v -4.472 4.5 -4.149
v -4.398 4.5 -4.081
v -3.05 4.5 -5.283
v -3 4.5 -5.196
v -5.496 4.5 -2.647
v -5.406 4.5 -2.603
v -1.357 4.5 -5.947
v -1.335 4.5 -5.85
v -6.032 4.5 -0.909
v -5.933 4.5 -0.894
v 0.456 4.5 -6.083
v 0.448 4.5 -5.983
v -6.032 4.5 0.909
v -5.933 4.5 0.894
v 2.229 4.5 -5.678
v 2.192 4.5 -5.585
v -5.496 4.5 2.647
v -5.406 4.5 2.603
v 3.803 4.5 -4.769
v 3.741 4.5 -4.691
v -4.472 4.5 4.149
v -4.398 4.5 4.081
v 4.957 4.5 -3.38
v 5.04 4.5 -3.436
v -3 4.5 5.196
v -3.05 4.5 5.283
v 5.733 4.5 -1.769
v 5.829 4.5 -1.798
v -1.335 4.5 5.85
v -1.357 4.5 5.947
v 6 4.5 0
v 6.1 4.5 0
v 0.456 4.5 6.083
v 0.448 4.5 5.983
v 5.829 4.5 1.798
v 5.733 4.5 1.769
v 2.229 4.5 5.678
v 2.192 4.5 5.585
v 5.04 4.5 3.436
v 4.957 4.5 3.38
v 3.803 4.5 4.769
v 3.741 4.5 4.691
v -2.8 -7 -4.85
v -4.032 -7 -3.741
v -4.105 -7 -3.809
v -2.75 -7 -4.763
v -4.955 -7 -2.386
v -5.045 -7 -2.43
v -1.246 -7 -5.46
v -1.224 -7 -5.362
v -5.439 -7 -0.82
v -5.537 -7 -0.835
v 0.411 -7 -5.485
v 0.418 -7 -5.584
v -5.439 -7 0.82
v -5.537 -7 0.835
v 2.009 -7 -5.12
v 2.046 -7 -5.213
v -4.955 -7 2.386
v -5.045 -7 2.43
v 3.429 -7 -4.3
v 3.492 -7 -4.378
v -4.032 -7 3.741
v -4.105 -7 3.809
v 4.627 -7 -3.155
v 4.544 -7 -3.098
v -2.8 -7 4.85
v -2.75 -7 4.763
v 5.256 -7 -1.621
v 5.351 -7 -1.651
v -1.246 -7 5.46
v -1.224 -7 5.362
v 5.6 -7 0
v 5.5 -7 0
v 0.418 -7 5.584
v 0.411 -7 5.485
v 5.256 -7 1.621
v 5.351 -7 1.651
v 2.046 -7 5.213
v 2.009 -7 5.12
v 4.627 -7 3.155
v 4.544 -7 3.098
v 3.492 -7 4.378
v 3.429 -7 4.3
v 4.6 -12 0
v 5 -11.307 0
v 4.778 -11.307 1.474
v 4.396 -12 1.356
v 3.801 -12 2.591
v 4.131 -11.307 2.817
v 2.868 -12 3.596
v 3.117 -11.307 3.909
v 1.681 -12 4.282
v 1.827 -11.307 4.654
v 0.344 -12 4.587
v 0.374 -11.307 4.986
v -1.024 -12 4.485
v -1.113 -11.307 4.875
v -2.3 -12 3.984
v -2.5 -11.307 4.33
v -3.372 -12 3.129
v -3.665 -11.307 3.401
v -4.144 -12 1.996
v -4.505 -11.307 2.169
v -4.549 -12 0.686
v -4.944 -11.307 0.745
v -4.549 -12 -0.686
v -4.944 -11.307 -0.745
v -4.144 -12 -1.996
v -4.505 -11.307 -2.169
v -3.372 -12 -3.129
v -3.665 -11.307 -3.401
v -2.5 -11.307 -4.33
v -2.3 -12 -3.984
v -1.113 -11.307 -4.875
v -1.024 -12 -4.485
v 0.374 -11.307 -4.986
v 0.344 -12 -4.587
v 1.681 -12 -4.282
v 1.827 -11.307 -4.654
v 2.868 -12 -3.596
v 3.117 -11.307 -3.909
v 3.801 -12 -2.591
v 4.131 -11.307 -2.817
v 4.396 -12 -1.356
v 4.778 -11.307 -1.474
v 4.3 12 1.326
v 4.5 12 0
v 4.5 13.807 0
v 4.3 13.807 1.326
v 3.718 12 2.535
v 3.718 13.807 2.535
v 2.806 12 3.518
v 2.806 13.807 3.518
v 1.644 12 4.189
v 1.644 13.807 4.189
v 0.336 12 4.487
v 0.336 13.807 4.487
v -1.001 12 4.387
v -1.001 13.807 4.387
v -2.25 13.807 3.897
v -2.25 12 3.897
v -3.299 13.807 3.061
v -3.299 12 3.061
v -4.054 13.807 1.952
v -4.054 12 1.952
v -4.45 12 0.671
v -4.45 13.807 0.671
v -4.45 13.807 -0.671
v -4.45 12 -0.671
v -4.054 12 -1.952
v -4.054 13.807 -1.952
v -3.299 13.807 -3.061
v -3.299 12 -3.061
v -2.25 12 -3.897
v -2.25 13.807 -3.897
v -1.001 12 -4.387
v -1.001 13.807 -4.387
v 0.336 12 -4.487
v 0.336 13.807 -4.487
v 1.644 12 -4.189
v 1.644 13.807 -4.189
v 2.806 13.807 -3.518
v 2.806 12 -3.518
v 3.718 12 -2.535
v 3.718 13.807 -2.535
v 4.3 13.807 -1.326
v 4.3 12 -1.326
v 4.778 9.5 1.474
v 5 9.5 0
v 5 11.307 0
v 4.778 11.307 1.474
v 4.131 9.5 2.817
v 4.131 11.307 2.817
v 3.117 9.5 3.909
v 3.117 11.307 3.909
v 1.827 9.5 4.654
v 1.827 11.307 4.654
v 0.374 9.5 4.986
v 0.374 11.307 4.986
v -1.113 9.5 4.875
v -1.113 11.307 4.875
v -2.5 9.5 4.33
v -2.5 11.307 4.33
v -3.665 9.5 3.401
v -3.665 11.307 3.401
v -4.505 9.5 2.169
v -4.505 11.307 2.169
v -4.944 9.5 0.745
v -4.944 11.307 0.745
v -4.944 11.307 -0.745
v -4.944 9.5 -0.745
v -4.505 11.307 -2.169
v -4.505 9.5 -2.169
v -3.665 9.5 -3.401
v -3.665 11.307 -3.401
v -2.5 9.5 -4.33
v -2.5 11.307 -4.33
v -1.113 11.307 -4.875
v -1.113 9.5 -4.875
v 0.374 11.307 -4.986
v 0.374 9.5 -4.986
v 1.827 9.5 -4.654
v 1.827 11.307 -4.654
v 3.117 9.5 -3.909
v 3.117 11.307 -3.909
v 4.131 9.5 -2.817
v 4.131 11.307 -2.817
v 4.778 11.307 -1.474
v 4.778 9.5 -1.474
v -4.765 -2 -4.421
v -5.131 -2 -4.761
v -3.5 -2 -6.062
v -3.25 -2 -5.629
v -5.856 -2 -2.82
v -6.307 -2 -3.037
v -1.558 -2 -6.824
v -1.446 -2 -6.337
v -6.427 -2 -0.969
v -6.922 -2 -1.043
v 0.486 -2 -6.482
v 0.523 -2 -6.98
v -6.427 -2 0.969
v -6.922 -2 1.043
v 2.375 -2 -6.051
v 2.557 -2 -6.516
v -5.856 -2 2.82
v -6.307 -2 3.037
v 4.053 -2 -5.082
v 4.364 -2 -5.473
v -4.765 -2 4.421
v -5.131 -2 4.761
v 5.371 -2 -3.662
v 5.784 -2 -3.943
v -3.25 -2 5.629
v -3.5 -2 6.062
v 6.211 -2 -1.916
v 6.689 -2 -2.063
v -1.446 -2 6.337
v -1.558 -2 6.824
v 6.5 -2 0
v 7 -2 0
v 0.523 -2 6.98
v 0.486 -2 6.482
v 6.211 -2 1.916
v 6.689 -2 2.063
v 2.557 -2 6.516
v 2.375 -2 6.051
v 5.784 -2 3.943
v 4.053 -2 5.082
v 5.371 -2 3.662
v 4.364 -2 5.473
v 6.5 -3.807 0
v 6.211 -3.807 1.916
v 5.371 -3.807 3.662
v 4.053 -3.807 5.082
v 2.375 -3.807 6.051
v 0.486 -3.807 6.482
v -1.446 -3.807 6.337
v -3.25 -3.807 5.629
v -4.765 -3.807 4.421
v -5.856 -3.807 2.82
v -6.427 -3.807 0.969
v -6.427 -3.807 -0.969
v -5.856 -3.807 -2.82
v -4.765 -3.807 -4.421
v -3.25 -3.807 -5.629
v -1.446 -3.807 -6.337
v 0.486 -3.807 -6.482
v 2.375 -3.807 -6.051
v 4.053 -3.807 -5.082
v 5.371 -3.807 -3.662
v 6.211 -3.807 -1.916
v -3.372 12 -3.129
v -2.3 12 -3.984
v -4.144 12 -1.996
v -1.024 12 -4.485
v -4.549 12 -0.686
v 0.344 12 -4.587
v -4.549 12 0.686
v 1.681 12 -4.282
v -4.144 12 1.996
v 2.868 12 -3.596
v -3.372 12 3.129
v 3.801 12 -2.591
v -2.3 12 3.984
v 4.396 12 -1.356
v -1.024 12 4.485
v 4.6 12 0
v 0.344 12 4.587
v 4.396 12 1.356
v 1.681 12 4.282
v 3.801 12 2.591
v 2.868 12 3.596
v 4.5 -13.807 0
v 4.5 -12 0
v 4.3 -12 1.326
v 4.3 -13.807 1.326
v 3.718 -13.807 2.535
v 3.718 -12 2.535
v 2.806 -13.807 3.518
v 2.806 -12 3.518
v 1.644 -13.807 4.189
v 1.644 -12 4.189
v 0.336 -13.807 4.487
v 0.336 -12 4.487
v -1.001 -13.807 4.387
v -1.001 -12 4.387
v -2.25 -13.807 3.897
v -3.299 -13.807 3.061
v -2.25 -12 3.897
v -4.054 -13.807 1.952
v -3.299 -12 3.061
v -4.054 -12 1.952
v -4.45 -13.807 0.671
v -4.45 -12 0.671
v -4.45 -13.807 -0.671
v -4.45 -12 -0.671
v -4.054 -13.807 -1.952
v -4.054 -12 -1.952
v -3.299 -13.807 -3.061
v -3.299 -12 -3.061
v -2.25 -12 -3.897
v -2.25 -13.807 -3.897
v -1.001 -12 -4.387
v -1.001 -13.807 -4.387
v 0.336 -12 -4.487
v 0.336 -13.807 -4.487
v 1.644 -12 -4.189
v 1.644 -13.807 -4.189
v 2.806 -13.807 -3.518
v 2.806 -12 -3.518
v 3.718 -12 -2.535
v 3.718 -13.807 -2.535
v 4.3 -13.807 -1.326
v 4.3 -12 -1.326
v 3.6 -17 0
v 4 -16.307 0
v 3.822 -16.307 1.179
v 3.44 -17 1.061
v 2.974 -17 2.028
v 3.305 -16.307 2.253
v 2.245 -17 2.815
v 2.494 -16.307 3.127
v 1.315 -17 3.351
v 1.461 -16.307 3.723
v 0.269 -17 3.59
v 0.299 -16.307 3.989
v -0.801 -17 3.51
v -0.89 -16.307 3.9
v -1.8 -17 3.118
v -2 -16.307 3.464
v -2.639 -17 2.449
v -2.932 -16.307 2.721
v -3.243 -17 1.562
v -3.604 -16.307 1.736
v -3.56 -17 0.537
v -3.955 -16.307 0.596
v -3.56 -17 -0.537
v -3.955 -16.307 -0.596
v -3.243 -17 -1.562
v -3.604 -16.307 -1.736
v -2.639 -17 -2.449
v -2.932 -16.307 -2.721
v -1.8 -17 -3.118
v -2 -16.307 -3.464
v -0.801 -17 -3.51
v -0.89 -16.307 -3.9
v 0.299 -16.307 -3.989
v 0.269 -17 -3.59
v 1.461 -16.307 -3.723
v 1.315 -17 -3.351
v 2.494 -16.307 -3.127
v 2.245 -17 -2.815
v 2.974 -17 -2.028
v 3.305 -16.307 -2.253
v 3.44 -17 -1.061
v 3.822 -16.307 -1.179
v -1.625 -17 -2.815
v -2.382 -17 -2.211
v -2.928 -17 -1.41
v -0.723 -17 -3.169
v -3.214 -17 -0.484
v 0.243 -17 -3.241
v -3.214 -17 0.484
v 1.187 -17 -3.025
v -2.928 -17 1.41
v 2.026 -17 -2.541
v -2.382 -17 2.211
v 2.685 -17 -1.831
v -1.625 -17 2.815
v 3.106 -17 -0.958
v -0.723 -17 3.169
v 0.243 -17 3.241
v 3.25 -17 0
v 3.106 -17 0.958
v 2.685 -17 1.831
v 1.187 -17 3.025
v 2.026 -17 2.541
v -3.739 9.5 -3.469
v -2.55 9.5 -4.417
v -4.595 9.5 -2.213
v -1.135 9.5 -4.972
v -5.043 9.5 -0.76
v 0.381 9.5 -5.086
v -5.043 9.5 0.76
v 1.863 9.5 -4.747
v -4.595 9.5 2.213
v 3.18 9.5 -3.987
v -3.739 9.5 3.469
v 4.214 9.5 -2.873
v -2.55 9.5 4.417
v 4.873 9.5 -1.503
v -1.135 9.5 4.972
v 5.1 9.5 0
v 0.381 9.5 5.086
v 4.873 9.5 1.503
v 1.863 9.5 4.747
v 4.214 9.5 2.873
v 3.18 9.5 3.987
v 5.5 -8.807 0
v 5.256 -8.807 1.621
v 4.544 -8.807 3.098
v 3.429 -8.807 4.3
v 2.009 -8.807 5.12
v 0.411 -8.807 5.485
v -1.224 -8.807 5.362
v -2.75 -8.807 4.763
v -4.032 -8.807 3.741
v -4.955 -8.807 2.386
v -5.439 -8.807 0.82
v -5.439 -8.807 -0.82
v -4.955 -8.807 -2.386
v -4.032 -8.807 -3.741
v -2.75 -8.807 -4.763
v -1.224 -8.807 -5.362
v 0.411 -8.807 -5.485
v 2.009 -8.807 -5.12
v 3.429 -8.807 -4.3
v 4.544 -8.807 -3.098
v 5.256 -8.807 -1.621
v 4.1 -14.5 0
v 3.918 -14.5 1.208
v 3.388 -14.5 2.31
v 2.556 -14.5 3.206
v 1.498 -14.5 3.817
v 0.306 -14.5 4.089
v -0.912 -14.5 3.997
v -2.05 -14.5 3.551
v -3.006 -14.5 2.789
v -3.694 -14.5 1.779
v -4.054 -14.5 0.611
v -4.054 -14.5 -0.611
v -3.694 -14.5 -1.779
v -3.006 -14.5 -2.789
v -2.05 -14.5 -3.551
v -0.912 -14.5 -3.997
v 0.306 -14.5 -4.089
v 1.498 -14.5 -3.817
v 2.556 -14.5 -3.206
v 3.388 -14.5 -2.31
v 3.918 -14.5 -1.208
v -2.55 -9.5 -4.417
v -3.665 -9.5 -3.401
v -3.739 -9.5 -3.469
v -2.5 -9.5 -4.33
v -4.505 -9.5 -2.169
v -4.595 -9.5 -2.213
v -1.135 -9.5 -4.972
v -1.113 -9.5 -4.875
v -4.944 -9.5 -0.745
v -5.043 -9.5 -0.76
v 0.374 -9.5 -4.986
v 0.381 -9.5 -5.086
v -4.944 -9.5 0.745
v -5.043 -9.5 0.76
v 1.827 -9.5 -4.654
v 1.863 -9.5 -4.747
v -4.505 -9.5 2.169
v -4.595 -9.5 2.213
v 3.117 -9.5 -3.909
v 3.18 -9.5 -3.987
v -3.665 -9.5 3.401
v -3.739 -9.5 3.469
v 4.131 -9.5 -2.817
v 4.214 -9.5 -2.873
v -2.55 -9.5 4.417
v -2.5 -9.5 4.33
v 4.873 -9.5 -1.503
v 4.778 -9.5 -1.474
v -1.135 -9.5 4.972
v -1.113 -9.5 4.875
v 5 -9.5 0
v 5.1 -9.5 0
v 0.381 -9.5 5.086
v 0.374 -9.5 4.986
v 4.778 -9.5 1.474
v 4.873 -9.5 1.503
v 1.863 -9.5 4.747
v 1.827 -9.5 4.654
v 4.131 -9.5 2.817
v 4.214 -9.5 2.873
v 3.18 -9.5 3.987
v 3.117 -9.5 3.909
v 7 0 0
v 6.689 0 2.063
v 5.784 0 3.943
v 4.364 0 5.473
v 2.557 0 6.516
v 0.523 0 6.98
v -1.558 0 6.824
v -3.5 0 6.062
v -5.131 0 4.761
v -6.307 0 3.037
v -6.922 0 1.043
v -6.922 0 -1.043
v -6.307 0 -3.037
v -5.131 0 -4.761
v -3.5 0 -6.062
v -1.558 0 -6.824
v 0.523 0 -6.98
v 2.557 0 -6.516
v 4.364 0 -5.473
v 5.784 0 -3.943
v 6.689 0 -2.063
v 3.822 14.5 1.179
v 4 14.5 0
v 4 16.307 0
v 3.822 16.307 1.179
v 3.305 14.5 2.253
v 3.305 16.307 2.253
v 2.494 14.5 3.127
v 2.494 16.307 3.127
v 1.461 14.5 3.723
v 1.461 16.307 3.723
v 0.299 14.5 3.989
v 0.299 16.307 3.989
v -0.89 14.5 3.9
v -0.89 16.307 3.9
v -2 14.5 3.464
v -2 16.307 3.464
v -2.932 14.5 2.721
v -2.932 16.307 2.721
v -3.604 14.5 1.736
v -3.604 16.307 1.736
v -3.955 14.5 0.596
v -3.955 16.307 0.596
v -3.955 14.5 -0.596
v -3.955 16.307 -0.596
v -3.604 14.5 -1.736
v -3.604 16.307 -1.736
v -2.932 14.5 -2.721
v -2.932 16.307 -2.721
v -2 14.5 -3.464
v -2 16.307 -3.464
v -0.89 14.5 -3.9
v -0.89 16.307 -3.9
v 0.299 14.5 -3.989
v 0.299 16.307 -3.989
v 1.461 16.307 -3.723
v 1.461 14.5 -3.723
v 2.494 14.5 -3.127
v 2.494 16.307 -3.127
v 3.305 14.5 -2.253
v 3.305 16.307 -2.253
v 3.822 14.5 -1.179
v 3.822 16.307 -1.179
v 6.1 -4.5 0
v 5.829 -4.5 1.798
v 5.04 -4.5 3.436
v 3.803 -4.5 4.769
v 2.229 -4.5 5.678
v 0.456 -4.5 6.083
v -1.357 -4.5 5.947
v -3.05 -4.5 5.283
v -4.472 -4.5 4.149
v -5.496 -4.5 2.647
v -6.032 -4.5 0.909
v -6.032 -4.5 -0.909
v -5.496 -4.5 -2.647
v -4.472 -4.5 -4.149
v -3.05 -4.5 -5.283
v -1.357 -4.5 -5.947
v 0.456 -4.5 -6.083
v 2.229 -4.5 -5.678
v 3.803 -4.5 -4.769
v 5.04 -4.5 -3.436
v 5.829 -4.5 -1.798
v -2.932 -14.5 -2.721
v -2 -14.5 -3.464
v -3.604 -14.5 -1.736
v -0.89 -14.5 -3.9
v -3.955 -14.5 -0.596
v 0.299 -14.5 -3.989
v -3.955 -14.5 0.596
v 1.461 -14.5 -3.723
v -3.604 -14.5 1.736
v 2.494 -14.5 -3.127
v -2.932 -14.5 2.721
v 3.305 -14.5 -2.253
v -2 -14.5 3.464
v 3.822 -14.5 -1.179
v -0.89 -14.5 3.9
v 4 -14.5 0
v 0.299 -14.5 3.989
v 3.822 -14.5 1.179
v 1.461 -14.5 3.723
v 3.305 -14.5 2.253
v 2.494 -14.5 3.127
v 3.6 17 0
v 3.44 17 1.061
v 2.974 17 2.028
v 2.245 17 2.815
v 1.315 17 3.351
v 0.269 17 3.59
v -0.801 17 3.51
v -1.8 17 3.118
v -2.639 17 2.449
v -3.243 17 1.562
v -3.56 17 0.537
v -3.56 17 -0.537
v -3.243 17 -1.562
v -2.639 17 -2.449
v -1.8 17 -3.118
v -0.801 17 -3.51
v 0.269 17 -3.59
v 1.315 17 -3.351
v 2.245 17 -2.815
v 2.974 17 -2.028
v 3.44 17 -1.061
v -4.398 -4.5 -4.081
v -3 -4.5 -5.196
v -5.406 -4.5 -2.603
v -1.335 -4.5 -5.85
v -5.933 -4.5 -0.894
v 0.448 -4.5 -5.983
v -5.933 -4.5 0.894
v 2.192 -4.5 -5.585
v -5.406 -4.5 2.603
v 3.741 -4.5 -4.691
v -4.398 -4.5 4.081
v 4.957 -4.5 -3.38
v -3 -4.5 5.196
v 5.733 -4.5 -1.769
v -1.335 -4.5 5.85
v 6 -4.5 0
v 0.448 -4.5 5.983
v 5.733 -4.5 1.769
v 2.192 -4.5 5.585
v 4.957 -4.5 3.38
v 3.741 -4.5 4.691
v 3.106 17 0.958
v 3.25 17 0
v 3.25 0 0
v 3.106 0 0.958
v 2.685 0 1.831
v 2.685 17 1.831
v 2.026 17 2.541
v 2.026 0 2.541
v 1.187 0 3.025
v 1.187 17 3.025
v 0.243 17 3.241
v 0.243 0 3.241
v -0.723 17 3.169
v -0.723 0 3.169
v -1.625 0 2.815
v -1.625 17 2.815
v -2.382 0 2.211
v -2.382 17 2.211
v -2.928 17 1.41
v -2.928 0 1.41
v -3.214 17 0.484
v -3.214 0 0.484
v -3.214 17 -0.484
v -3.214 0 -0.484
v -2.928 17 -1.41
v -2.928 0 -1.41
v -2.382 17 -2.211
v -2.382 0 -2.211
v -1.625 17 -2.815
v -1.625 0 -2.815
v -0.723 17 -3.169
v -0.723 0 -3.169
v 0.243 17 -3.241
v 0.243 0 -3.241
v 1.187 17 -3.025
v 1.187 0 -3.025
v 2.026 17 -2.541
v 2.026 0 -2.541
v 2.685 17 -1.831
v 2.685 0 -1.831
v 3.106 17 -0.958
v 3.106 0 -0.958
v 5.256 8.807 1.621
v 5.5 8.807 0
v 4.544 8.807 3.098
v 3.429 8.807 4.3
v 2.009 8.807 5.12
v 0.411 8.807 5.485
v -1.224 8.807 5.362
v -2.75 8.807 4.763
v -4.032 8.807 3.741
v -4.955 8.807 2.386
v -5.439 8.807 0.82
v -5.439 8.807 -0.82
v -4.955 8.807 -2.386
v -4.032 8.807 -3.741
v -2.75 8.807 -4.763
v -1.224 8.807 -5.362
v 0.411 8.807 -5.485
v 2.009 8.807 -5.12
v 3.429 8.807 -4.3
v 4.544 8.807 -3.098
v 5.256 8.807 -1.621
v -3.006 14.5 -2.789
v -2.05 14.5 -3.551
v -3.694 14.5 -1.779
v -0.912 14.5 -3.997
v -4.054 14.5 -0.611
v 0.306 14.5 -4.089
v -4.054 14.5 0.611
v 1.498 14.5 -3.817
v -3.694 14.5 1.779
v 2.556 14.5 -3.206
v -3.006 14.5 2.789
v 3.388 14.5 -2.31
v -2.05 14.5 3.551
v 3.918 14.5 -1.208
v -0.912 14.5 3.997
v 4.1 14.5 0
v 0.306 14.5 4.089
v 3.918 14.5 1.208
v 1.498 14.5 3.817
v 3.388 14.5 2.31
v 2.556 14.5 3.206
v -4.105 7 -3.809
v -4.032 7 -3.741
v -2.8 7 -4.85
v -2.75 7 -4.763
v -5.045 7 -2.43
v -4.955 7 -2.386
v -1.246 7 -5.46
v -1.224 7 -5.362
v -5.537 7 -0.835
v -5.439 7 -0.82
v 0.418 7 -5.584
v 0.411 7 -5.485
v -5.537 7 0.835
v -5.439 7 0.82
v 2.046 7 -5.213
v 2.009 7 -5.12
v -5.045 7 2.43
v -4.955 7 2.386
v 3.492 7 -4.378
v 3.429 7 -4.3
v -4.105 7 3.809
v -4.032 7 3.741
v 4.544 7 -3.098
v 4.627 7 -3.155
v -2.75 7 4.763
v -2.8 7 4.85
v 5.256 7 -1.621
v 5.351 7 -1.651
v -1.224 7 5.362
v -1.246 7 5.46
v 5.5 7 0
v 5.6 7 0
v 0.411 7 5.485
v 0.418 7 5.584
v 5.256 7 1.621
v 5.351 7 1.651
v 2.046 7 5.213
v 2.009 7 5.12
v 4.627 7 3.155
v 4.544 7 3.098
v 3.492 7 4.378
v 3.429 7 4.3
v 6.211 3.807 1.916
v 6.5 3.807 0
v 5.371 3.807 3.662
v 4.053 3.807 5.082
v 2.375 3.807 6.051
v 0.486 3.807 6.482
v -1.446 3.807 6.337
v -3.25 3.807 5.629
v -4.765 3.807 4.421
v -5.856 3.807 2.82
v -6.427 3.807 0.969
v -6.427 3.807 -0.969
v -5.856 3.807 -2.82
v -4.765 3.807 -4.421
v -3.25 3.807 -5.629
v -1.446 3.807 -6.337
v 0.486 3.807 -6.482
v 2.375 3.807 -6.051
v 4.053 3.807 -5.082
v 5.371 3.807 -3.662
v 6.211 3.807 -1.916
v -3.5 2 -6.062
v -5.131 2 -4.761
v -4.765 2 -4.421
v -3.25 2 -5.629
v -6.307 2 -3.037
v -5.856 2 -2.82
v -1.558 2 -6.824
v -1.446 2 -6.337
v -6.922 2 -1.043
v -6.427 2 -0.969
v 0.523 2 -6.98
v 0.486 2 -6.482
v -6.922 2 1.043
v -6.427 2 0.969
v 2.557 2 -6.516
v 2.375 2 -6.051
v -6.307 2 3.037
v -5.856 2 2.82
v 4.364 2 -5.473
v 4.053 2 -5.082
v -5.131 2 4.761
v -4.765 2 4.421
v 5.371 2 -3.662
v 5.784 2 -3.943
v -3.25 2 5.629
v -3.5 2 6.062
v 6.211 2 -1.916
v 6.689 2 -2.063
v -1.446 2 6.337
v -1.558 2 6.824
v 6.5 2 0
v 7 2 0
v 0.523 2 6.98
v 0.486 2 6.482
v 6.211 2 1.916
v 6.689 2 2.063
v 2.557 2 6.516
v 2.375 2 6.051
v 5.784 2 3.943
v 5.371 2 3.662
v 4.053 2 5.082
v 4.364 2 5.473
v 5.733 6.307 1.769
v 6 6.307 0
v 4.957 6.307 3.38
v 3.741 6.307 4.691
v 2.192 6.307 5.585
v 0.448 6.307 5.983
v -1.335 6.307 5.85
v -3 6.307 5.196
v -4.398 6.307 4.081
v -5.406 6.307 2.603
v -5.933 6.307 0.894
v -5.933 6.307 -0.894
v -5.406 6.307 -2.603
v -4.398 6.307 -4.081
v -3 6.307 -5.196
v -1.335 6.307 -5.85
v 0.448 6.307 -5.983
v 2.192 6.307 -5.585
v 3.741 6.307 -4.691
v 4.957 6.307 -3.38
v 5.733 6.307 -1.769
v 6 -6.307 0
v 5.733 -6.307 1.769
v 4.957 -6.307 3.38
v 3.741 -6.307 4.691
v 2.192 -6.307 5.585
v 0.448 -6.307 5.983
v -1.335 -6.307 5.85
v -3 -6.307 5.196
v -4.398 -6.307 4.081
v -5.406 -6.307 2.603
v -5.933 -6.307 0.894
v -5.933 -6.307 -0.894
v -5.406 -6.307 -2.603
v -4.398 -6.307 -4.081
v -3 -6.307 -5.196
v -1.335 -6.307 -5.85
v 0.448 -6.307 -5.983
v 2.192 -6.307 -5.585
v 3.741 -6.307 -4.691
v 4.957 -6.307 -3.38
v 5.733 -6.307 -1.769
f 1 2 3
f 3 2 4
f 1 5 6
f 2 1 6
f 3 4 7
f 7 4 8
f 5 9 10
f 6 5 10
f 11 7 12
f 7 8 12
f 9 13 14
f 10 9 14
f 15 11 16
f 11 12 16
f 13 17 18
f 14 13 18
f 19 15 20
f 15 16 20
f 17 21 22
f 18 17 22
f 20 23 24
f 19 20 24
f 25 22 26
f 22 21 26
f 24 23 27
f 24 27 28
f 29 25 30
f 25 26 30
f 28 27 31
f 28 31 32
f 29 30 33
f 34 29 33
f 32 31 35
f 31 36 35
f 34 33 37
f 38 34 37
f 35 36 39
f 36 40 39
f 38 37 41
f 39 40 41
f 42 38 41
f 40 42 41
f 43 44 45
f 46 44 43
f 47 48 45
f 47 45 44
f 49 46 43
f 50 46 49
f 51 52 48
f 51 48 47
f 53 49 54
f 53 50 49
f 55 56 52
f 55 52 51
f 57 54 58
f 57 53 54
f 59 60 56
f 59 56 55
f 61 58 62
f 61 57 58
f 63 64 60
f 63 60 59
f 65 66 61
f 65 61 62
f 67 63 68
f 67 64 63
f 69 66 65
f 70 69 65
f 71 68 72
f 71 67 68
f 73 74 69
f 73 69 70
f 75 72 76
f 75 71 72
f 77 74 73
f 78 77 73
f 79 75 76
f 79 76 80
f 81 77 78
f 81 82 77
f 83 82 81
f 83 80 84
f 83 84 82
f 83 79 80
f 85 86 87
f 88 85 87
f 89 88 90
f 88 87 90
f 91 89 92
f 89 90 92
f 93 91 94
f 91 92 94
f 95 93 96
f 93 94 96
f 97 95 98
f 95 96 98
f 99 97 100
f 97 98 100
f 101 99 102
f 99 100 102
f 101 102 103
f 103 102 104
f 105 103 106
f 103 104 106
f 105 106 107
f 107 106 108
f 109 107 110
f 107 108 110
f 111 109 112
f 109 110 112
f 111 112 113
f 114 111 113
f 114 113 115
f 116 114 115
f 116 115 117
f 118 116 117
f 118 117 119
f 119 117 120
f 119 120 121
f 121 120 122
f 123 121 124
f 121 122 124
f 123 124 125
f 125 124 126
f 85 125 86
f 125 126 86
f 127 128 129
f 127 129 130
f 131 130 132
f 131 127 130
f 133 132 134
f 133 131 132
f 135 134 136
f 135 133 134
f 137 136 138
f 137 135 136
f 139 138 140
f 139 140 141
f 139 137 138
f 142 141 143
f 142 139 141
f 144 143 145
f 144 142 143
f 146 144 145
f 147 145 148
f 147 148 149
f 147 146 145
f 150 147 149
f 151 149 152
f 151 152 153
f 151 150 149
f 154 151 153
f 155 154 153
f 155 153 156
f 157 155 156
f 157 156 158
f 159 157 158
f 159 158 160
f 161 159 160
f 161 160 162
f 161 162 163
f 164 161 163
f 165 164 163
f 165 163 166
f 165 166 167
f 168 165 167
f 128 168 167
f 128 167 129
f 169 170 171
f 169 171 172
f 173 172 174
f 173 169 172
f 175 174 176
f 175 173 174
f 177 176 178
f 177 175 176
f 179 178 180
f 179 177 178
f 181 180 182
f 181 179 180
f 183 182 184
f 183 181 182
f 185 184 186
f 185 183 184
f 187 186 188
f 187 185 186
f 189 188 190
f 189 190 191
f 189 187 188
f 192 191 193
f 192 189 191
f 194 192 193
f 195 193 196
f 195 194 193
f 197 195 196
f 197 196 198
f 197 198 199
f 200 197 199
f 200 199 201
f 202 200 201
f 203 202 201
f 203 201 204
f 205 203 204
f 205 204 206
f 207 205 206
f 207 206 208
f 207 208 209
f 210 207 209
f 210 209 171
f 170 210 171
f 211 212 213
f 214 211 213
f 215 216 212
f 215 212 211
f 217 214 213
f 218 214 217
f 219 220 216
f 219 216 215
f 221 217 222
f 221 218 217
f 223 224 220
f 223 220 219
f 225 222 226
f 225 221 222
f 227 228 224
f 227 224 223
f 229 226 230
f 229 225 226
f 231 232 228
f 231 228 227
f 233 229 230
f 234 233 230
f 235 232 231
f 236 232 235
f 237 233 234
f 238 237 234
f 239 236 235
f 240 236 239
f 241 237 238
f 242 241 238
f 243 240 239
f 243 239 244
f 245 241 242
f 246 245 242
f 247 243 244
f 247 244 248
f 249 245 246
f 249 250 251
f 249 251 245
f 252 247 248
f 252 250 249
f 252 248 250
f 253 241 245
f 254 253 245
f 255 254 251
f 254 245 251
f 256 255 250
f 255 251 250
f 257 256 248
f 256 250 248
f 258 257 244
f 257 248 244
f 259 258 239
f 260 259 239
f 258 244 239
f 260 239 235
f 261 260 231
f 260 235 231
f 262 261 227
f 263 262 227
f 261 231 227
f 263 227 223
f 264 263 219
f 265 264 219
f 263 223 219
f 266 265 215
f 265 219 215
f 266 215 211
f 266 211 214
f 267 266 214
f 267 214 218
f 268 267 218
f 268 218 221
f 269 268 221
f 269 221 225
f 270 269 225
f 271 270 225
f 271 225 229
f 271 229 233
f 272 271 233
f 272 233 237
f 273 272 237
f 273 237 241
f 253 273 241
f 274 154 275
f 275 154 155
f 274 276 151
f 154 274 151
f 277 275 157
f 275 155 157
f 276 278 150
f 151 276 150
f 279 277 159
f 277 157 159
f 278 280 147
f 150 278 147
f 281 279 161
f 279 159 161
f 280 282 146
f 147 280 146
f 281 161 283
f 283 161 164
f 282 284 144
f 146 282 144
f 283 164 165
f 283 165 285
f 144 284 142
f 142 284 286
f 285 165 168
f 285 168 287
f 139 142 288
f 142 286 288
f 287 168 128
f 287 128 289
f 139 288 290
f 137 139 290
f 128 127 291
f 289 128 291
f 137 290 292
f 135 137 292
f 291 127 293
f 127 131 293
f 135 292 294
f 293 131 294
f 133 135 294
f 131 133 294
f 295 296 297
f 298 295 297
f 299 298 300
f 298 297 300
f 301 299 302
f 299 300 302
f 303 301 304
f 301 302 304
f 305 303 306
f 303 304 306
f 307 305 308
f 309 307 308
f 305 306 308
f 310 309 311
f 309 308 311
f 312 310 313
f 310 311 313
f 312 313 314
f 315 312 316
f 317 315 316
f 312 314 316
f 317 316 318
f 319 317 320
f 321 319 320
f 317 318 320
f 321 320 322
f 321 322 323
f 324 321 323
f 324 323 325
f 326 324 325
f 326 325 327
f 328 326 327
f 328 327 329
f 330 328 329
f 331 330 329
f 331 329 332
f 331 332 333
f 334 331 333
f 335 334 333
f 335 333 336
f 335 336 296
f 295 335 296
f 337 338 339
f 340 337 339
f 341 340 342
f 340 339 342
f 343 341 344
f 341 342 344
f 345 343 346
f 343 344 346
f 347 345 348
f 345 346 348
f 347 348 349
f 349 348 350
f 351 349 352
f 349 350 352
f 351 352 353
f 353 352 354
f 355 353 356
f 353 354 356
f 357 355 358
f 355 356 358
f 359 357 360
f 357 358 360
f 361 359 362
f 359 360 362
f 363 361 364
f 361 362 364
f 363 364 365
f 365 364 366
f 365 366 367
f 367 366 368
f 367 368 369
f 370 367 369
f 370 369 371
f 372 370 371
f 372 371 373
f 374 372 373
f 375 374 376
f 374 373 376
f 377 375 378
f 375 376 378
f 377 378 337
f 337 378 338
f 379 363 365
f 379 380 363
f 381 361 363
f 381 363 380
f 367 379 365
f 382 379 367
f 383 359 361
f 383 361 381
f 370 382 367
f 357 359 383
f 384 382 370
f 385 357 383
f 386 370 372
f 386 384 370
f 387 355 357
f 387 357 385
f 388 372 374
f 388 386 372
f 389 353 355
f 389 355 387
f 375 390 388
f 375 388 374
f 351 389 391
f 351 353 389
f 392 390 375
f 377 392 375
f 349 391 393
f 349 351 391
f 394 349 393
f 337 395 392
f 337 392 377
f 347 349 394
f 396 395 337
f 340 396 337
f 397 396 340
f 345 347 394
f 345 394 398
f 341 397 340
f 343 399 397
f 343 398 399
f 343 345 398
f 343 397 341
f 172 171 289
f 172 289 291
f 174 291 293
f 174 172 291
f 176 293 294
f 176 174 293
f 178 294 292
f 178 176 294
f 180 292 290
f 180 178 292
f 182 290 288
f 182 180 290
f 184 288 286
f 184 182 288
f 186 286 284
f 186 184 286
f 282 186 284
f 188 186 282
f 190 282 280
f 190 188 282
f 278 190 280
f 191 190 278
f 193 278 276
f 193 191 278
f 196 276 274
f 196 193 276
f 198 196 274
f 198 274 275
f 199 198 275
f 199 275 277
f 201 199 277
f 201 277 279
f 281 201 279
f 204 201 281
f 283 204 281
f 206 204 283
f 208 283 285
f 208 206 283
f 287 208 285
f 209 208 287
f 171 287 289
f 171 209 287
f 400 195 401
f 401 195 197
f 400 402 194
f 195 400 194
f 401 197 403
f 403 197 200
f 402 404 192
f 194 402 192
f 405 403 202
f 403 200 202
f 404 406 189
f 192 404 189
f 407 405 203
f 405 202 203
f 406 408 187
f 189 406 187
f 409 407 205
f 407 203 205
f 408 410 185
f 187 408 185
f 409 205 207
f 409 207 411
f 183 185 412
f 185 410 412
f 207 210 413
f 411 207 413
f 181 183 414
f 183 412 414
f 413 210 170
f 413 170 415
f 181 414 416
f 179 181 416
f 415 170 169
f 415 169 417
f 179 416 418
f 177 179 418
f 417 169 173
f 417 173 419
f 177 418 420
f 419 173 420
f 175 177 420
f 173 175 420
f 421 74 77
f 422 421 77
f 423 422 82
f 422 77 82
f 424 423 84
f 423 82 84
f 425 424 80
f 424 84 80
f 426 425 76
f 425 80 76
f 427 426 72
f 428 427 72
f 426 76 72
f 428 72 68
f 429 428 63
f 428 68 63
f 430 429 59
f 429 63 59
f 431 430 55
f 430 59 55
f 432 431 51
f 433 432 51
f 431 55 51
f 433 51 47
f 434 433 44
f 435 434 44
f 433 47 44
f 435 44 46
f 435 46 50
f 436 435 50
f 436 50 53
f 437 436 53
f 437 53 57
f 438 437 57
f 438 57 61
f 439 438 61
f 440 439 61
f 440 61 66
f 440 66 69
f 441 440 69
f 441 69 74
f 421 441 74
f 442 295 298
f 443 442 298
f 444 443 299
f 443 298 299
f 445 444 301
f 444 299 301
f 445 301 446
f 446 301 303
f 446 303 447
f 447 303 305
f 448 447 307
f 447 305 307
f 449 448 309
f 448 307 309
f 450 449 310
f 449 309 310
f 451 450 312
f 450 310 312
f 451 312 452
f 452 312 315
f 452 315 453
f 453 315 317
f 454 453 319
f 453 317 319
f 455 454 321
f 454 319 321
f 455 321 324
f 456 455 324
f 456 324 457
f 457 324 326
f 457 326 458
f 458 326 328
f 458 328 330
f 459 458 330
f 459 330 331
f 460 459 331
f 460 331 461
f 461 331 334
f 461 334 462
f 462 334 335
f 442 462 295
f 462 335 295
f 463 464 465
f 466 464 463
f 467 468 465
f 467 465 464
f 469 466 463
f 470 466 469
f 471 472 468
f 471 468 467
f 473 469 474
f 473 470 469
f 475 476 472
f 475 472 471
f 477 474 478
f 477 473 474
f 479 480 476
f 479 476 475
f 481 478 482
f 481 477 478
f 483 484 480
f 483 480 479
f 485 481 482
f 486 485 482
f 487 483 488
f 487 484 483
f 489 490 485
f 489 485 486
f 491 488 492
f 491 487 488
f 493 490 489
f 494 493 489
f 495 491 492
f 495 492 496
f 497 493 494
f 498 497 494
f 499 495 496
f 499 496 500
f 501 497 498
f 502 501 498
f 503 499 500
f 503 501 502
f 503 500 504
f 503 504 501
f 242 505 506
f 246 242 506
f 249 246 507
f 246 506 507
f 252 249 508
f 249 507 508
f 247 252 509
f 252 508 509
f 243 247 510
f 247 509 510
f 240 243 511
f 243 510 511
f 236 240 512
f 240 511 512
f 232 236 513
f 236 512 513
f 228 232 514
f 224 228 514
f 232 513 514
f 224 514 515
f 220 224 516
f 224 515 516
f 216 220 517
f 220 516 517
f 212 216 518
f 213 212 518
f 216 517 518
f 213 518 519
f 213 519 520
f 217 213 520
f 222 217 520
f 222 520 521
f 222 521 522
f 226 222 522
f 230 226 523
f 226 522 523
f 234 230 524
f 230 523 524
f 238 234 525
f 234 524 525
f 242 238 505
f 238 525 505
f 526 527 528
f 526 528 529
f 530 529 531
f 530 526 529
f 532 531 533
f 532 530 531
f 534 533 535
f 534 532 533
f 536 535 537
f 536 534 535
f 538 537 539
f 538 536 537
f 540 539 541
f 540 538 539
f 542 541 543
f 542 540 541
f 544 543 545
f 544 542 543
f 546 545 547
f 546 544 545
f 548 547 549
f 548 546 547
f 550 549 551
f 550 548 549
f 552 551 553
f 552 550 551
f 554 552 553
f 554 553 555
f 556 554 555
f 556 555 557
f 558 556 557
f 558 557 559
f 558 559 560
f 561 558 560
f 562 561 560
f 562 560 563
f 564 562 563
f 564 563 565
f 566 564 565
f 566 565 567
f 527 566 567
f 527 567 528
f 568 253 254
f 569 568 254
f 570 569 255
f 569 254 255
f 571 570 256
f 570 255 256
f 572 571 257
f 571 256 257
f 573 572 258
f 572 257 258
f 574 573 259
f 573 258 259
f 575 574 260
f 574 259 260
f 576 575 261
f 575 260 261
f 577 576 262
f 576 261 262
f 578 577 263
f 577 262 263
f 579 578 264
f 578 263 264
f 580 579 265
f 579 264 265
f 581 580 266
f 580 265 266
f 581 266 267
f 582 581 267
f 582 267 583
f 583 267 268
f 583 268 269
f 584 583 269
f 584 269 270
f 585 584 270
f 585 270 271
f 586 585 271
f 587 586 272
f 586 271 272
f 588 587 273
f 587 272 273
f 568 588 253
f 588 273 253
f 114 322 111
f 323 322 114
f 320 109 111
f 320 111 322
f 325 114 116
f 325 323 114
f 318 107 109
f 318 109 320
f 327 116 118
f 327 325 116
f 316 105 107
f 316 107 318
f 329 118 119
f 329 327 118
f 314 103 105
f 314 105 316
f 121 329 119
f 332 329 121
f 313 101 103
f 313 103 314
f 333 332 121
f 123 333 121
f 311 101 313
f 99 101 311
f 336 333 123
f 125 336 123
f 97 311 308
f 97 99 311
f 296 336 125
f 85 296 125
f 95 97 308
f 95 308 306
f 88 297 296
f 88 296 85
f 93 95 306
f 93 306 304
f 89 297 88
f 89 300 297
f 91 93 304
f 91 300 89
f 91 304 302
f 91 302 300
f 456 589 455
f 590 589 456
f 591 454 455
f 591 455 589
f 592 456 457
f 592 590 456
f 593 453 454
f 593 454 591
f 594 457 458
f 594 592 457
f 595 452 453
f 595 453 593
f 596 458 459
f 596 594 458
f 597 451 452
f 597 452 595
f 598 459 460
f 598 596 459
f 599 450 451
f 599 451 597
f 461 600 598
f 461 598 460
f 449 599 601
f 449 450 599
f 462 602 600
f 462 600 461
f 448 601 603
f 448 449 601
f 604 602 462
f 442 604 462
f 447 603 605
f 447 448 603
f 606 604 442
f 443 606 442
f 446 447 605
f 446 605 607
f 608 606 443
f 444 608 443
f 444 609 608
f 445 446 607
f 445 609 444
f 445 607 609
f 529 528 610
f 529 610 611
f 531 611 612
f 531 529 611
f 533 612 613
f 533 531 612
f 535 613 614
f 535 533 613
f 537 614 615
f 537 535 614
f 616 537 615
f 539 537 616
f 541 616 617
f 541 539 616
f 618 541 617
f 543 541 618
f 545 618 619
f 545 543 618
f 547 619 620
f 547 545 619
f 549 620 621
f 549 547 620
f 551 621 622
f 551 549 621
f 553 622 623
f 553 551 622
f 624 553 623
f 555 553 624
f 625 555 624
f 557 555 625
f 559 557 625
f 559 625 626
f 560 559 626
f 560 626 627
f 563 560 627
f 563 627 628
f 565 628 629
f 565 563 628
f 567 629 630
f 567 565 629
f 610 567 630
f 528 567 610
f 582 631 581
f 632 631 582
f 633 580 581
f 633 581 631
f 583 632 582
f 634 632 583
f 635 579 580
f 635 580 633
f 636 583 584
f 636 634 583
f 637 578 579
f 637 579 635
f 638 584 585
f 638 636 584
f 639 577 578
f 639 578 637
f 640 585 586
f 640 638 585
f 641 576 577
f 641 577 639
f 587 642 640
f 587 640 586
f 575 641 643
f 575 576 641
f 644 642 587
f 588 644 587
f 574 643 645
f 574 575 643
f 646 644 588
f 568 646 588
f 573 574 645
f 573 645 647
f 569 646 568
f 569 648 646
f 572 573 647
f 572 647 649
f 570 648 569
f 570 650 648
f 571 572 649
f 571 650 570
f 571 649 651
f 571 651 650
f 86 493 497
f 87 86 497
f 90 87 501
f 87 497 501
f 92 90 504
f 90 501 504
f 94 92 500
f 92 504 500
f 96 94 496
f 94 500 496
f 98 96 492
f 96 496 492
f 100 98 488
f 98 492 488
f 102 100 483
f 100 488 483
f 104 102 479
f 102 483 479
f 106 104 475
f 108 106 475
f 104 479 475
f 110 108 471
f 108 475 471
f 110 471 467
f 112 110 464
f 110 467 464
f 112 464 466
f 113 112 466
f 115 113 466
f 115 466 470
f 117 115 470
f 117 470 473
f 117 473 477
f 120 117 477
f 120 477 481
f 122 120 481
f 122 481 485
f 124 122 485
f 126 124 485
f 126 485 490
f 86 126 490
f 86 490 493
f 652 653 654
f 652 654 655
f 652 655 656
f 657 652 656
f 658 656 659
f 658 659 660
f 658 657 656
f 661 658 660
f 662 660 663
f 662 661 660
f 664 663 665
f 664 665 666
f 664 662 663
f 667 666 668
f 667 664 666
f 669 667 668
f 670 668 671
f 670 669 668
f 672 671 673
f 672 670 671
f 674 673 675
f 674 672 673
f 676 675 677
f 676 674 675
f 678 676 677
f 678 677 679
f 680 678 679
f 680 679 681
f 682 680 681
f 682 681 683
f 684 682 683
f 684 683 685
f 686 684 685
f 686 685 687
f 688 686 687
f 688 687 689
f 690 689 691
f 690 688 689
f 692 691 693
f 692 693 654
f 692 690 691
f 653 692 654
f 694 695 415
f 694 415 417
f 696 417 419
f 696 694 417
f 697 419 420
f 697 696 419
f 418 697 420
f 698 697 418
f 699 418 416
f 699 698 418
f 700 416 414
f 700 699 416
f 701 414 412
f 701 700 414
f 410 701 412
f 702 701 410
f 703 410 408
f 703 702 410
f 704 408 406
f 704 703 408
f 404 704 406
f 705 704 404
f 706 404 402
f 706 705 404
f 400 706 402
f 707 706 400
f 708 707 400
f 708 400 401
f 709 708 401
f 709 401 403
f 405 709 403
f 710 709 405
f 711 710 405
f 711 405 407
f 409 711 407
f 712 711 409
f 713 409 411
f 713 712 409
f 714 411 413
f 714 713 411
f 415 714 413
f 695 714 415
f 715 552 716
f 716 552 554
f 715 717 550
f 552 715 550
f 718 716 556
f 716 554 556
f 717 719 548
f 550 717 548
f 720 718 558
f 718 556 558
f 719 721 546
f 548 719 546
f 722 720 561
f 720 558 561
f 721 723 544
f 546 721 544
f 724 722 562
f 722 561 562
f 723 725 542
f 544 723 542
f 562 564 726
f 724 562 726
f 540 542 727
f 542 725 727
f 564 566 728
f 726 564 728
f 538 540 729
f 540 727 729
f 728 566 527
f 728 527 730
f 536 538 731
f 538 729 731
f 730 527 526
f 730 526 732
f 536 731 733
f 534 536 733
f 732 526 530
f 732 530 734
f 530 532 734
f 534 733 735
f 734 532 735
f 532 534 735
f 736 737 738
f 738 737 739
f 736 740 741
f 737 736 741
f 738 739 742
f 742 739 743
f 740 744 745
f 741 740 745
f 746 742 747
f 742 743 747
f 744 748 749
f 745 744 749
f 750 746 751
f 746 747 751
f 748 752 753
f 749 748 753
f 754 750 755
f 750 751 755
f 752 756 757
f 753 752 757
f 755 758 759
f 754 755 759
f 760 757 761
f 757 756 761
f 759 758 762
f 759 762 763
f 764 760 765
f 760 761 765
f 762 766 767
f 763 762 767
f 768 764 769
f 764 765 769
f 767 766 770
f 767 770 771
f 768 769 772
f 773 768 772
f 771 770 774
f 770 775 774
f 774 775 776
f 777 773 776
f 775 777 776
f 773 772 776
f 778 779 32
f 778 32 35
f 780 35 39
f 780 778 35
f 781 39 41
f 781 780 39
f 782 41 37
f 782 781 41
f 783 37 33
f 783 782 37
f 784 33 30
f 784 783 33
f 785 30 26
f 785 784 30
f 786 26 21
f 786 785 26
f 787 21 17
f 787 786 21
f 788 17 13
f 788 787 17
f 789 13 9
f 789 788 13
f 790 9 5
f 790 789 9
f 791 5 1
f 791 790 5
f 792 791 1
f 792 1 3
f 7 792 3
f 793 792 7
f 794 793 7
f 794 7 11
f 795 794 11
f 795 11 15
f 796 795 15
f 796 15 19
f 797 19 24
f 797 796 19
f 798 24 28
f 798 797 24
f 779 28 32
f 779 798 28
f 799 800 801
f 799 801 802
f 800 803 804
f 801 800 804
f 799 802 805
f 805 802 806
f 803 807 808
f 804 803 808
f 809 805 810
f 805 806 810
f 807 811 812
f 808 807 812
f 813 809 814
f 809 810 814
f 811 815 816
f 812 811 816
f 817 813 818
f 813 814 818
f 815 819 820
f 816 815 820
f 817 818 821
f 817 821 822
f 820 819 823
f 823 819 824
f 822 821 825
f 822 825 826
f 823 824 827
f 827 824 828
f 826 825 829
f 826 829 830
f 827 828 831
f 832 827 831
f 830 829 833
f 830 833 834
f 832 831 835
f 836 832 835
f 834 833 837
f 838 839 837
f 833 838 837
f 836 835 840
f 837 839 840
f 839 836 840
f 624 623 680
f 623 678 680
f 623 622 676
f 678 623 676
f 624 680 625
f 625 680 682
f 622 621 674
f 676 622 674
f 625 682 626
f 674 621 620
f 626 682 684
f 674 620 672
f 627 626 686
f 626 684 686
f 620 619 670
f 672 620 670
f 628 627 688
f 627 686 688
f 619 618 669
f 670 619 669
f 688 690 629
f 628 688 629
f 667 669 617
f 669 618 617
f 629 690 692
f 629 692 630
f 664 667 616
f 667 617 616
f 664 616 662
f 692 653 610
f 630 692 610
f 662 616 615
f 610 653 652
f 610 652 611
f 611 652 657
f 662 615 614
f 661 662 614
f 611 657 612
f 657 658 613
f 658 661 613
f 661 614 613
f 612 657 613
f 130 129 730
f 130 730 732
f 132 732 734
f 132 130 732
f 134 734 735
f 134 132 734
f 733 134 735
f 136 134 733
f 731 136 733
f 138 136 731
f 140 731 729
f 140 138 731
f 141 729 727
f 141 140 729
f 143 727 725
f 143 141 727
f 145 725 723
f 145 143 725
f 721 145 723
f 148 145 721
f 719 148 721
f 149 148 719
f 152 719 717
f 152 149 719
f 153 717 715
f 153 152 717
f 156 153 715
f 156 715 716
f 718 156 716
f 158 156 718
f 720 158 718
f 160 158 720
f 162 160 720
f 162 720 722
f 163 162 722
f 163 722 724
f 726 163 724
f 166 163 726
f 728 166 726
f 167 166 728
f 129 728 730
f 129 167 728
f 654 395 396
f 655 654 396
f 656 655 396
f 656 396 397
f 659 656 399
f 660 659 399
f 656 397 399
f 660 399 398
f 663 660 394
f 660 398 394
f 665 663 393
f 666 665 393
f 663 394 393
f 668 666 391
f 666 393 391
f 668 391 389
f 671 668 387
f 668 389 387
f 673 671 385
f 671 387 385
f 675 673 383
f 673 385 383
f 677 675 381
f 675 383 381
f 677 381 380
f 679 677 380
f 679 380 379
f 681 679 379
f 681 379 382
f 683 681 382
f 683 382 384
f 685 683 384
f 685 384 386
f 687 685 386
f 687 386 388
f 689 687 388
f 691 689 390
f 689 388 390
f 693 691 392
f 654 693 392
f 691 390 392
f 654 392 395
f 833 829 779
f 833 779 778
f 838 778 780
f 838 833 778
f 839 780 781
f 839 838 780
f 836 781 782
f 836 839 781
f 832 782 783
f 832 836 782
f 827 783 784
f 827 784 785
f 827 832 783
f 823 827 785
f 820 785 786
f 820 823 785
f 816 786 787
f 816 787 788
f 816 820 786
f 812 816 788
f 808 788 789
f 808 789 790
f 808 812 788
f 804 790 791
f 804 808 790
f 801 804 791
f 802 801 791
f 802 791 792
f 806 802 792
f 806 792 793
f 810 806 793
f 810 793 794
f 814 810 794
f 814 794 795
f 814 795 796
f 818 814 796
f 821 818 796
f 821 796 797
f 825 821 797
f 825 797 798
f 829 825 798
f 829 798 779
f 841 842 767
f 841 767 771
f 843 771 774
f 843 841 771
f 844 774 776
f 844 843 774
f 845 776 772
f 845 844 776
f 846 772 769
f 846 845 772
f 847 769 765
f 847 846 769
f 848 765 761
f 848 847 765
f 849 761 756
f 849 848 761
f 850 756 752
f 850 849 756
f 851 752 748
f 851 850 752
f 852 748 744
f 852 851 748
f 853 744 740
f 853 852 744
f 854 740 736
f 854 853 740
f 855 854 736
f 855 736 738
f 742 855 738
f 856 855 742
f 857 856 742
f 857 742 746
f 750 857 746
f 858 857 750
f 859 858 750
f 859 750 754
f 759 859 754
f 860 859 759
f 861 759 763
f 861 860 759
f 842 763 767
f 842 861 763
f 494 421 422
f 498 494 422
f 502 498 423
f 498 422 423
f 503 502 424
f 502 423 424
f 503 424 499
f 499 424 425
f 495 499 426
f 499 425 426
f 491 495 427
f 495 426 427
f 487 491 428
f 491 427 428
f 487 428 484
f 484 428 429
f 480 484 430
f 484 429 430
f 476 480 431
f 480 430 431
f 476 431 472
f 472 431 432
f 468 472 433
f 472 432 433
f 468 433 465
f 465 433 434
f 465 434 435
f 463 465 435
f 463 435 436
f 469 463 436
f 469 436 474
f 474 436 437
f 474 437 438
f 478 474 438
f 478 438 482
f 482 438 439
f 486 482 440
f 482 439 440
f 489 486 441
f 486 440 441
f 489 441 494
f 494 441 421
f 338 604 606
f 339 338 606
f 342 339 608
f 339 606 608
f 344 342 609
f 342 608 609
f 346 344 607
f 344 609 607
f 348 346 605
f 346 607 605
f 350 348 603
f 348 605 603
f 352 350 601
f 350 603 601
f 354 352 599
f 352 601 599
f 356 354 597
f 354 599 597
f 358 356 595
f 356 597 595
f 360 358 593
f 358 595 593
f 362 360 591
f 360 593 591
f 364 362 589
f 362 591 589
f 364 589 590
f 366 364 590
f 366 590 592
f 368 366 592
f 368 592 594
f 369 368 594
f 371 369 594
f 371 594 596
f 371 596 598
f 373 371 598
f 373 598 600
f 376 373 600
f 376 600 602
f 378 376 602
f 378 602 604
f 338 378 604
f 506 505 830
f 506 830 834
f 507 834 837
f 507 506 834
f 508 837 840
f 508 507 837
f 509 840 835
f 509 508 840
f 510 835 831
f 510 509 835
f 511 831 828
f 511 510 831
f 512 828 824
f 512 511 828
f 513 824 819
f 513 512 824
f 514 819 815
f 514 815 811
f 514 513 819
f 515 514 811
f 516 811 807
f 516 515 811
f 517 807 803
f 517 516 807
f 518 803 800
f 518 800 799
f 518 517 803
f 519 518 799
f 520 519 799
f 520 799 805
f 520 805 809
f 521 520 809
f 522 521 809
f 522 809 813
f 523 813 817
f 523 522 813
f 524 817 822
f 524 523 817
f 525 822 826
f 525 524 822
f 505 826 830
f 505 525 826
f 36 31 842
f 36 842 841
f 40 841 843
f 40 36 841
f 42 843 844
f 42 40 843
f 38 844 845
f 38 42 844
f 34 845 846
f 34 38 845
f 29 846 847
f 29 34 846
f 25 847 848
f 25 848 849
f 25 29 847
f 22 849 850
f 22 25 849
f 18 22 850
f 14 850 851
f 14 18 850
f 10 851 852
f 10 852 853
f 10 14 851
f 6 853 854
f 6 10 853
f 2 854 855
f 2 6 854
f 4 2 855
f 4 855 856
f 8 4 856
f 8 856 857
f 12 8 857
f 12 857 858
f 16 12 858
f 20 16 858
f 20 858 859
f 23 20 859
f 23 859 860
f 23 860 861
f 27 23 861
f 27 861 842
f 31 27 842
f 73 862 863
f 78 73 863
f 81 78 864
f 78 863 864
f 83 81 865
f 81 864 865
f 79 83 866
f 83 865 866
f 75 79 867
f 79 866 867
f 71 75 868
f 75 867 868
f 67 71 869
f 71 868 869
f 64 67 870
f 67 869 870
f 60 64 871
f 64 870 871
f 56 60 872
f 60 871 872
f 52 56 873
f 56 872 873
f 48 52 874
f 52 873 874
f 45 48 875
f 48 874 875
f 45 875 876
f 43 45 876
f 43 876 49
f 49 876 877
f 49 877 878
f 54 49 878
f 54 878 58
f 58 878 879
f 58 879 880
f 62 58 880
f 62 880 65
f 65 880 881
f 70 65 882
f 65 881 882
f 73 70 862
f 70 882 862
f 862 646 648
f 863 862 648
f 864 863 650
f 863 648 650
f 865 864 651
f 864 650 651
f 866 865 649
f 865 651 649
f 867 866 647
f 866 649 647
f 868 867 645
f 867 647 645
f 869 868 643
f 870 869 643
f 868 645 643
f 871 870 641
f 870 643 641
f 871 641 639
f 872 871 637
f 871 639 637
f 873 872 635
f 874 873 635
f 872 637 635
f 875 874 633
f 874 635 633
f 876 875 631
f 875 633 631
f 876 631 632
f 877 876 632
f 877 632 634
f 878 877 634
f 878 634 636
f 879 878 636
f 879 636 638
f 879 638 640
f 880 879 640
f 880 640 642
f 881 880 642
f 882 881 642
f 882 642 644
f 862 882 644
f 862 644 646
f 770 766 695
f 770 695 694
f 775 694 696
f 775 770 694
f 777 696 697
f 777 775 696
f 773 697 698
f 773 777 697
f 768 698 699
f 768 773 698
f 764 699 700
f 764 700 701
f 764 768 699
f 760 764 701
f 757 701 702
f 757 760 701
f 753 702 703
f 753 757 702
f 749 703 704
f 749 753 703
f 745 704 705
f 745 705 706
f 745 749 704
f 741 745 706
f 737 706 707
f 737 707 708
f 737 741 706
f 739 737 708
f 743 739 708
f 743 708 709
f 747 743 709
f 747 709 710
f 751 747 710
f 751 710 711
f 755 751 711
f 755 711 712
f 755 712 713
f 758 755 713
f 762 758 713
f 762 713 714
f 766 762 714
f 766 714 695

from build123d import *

# Parameters (mm, degrees)
F0_R        = 7
F0_R_2      = 6.5
F0_R_3      = 6
F0_R_4      = 5.5
F0_R_5      = 5
F0_R_6      = 4.5
F0_R_7      = 4
F1_DEPTH    = 2
F2_DEPTH    = 4.5
F3_DEPTH    = 7
F4_DEPTH    = 9.5
F5_DEPTH    = 12
F6_DEPTH    = 14.5
F7_DEPTH    = 17
F8_R        = 3.25
F9_DEPTH    = 17
F10_SIZE2   = 0.692820323
F10_SIZE    = 0.4
F10_2_SIZE2 = 0.692820323
F10_2_SIZE  = 0.4
F10_3_SIZE2 = 0.692820323
F10_3_SIZE  = 0.4
F10_4_SIZE2 = 0.692820323
F10_4_SIZE  = 0.4
F10_5_SIZE2 = 0.692820323
F10_5_SIZE  = 0.4
F10_6_SIZE2 = 0.692820323
F10_6_SIZE  = 0.4


with BuildPart() as f1:
    # F0 (on Front) → F1 (new body)
    with BuildSketch(Plane.XZ):
        Circle(F0_R)
        Circle(F0_R_2, mode=Mode.SUBTRACT)
        Circle(F0_R_2)
        Circle(F0_R_3, mode=Mode.SUBTRACT)
        Circle(F0_R_3)
        Circle(F0_R_4, mode=Mode.SUBTRACT)
        Circle(F0_R_4)
        Circle(F0_R_5, mode=Mode.SUBTRACT)
        Circle(F0_R_5)
        Circle(F0_R_6, mode=Mode.SUBTRACT)
        Circle(F0_R_6)
        Circle(F0_R_7, mode=Mode.SUBTRACT)
        Circle(F0_R_7)
    extrude(amount=F1_DEPTH)

    # F0 (on Front) → F2 (join, through all)
    with BuildSketch(Plane.XZ):
        Circle(F0_R_2)
        Circle(F0_R_3, mode=Mode.SUBTRACT)
        Circle(F0_R_3)
        Circle(F0_R_4, mode=Mode.SUBTRACT)
        Circle(F0_R_4)
        Circle(F0_R_5, mode=Mode.SUBTRACT)
        Circle(F0_R_5)
        Circle(F0_R_6, mode=Mode.SUBTRACT)
        Circle(F0_R_6)
        Circle(F0_R_7, mode=Mode.SUBTRACT)
        Circle(F0_R_7)
    extrude(amount=F2_DEPTH)

    # F0 (on Front) → F3 (join, through all)
    with BuildSketch(Plane.XZ):
        Circle(F0_R_3)
        Circle(F0_R_4, mode=Mode.SUBTRACT)
        Circle(F0_R_4)
        Circle(F0_R_5, mode=Mode.SUBTRACT)
        Circle(F0_R_5)
        Circle(F0_R_6, mode=Mode.SUBTRACT)
        Circle(F0_R_6)
        Circle(F0_R_7, mode=Mode.SUBTRACT)
        Circle(F0_R_7)
    extrude(amount=F3_DEPTH)

    # F0 (on Front) → F4 (join, through all)
    with BuildSketch(Plane.XZ):
        Circle(F0_R_4)
        Circle(F0_R_5, mode=Mode.SUBTRACT)
        Circle(F0_R_5)
        Circle(F0_R_6, mode=Mode.SUBTRACT)
        Circle(F0_R_6)
        Circle(F0_R_7, mode=Mode.SUBTRACT)
        Circle(F0_R_7)
    extrude(amount=F4_DEPTH)

    # F0 (on Front) → F5 (join, through all)
    with BuildSketch(Plane.XZ):
        Circle(F0_R_5)
        Circle(F0_R_6, mode=Mode.SUBTRACT)
        Circle(F0_R_6)
        Circle(F0_R_7, mode=Mode.SUBTRACT)
        Circle(F0_R_7)
    extrude(amount=F5_DEPTH)

    # F0 (on Front) → F6 (join, through all)
    with BuildSketch(Plane.XZ):
        Circle(F0_R_6)
        Circle(F0_R_7, mode=Mode.SUBTRACT)
        Circle(F0_R_7)
    extrude(amount=F6_DEPTH)

    # F0 (on Front) → F7 (join, through all)
    with BuildSketch(Plane.XZ):
        Circle(F0_R_7)
    extrude(amount=F7_DEPTH)

    # F8 (on face) → F9 (cut, through all)
    with BuildSketch(Plane.XZ.offset(17)):
        Circle(F8_R)
    extrude(amount=-F9_DEPTH, mode=Mode.SUBTRACT)

    # F10
    f10_edges = [f1.edges().sort_by_distance(p)[0] for p in [
        (-5, -12, 0),
    ]]
    f10_side = f1.faces().sort_by_distance((-4.858579, -12, 0))[0]
    chamfer(f10_edges, length=F10_SIZE, length2=F10_SIZE2, reference=f10_side)

    # F10#2
    f10_2_edges = [f1.edges().sort_by_distance(p)[0] for p in [
        (-5.5, -9.5, 0),
    ]]
    f10_2_side = f1.faces().sort_by_distance((-5.344437, -9.5, 0))[0]
    chamfer(f10_2_edges, length=F10_2_SIZE, length2=F10_2_SIZE2, reference=f10_2_side)

    # F10#3
    f10_3_edges = [f1.edges().sort_by_distance(p)[0] for p in [
        (-6, -7, 0),
    ]]
    f10_3_side = f1.faces().sort_by_distance((-5.830294, -7, 0))[0]
    chamfer(f10_3_edges, length=F10_3_SIZE, length2=F10_3_SIZE2, reference=f10_3_side)

    # F10#4
    f10_4_edges = [f1.edges().sort_by_distance(p)[0] for p in [
        (-6.5, -4.5, 0),
    ]]
    f10_4_side = f1.faces().sort_by_distance((-6.316152, -4.5, 0))[0]
    chamfer(f10_4_edges, length=F10_4_SIZE, length2=F10_4_SIZE2, reference=f10_4_side)

    # F10#5
    f10_5_edges = [f1.edges().sort_by_distance(p)[0] for p in [
        (-4.5, -14.5, 0),
    ]]
    f10_5_side = f1.faces().sort_by_distance((-4.372721, -14.5, 0))[0]
    chamfer(f10_5_edges, length=F10_5_SIZE, length2=F10_5_SIZE2, reference=f10_5_side)

    # F10#6
    f10_6_edges = [f1.edges().sort_by_distance(p)[0] for p in [
        (-4, -17, 0),
    ]]
    f10_6_side = f1.faces().sort_by_distance((-3.886863, -17, 0))[0]
    chamfer(f10_6_edges, length=F10_6_SIZE, length2=F10_6_SIZE2, reference=f10_6_side)

    # F11: F1 across plane


with BuildPart() as f1_1:
    add(f1.part)
    add(f1.part.mirror(Plane.XZ))


solid = f1_1.part
